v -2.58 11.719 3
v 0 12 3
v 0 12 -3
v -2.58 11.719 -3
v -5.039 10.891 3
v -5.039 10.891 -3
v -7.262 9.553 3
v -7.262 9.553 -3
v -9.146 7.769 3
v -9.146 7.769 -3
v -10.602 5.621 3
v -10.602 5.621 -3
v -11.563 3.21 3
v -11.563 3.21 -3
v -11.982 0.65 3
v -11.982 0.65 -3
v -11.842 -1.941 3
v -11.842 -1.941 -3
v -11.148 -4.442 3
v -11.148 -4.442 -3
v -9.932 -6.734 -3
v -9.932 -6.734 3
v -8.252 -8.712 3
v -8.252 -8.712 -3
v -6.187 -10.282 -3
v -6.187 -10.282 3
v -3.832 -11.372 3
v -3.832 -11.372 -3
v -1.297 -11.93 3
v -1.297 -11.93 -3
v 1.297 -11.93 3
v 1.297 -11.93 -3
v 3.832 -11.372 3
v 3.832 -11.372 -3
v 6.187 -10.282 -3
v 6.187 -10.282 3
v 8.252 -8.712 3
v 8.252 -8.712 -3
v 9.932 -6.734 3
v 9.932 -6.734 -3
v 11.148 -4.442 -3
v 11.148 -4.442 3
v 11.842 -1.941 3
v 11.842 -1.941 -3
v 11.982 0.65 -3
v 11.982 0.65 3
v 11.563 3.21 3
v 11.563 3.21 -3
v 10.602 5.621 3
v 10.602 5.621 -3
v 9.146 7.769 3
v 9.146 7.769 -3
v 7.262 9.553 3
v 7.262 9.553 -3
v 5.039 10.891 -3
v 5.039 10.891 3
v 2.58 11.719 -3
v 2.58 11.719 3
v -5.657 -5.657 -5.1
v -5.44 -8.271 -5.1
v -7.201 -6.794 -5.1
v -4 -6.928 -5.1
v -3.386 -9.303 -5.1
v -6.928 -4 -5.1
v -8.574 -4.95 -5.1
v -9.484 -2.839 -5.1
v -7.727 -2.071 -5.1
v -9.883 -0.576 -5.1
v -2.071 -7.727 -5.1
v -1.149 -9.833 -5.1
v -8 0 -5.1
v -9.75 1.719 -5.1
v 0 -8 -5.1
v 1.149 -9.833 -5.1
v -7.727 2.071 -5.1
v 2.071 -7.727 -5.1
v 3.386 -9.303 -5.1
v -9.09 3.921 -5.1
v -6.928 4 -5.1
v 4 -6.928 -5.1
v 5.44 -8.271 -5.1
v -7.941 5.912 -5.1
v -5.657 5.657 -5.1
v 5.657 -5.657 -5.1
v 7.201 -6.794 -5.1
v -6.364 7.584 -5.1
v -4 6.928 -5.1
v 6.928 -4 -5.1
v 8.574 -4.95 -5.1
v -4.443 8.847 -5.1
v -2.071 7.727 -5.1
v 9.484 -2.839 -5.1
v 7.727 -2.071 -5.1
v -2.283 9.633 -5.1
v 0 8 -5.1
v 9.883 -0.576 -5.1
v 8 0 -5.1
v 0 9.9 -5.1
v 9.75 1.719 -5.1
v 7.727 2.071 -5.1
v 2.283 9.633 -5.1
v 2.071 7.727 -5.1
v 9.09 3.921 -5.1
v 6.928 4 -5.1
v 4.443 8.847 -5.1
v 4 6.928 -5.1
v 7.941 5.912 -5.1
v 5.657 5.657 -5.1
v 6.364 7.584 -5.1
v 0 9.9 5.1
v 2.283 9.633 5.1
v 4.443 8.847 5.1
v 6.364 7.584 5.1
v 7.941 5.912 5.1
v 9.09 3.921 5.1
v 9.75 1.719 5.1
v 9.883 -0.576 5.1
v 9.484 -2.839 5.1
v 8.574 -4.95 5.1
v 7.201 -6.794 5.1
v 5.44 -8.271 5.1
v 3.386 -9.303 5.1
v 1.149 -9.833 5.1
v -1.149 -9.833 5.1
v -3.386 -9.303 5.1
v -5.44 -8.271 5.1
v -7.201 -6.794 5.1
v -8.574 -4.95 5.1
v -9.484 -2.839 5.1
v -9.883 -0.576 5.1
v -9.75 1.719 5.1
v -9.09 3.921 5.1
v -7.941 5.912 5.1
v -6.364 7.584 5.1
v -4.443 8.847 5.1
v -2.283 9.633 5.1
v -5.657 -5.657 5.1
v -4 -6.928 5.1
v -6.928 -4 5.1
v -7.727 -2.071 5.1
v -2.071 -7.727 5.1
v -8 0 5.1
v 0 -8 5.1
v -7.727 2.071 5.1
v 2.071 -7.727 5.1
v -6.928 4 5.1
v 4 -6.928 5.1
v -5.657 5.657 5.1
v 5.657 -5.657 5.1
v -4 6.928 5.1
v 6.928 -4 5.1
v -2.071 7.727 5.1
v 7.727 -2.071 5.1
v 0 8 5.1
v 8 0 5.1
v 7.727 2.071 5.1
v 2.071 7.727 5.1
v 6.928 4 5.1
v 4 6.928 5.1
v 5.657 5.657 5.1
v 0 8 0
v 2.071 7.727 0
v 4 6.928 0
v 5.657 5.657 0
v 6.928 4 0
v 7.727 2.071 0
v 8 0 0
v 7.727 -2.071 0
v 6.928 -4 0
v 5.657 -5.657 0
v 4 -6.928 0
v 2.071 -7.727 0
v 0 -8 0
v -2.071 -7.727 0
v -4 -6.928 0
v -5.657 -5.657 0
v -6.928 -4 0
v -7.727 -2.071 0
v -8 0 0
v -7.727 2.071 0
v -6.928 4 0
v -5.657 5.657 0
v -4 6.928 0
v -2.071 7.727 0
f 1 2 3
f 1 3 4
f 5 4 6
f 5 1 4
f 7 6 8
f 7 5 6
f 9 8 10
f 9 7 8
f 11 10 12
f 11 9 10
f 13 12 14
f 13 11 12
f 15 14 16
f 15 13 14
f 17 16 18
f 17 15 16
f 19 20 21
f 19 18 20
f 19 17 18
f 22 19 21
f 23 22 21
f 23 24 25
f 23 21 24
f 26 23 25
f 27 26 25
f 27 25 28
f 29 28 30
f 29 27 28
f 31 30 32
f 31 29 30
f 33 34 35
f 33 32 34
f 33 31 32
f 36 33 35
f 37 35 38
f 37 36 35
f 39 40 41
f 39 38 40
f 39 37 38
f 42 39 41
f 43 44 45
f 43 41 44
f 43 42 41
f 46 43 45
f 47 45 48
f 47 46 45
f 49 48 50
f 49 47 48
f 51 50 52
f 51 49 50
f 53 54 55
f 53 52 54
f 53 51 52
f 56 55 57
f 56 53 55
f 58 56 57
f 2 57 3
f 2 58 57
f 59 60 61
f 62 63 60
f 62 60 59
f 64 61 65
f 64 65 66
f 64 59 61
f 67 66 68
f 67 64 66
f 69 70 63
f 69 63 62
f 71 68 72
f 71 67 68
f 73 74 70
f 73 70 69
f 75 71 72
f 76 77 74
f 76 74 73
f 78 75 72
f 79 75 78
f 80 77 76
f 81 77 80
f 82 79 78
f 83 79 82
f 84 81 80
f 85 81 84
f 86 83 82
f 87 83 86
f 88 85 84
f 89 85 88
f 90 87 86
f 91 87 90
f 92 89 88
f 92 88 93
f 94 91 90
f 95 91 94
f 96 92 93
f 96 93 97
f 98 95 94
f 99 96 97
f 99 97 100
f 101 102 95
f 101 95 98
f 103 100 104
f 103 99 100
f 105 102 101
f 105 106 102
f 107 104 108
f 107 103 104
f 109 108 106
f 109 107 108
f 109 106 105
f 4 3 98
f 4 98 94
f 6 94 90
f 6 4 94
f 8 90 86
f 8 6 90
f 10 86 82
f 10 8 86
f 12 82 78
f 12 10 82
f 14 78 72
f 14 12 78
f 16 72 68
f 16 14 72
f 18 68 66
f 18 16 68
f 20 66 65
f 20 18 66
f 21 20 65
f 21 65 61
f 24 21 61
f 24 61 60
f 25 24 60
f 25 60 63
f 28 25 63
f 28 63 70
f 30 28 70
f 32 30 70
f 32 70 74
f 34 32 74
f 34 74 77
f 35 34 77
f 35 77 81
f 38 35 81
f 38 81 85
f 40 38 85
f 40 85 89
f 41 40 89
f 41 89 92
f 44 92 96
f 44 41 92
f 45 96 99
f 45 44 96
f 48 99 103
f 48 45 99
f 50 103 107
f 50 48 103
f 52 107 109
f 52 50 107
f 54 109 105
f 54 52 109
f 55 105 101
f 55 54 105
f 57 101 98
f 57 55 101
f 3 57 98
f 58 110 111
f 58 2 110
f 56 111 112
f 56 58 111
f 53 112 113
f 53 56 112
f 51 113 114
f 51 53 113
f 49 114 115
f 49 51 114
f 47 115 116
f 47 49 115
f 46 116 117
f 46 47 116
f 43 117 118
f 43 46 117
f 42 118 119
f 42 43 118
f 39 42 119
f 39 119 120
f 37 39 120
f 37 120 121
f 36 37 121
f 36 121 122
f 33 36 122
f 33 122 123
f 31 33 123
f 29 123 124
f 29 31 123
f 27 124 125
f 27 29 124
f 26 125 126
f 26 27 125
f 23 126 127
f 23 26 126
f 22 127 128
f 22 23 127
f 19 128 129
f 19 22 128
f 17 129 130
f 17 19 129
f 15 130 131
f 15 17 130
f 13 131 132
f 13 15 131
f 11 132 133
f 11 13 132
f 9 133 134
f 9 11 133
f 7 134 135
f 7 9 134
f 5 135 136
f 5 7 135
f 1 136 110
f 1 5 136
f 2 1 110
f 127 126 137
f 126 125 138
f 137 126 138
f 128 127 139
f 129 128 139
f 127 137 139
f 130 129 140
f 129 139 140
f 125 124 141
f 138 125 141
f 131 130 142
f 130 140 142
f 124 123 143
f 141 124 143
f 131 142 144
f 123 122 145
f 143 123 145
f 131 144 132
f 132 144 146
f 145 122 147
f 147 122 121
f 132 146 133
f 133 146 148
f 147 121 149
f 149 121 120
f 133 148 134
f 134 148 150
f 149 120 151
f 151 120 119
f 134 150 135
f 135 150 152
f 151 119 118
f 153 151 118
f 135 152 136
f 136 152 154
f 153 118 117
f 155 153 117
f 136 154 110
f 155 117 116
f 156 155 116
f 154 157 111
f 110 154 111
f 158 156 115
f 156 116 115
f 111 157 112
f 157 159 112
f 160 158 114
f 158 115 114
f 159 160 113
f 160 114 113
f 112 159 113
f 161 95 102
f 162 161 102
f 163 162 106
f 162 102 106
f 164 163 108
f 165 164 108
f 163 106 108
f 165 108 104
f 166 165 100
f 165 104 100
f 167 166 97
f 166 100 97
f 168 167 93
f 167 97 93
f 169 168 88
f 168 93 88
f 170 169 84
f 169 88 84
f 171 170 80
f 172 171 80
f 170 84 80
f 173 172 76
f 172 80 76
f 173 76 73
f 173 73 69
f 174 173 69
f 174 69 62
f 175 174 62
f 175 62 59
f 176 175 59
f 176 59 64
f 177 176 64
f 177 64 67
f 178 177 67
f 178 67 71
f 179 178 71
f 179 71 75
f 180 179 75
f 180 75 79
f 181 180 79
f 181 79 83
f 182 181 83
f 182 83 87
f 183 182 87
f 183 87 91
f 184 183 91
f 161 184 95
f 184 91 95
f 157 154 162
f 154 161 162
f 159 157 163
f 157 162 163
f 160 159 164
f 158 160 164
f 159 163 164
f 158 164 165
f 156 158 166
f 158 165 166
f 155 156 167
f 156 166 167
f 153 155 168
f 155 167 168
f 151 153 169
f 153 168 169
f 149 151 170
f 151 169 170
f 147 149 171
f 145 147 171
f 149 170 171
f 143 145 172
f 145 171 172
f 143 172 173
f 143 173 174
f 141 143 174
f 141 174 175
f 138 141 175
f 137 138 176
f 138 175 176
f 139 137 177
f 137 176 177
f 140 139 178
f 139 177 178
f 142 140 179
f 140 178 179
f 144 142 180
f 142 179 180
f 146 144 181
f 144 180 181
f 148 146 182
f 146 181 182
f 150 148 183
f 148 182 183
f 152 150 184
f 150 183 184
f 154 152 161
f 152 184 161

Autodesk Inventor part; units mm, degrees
ref_plane "YZ Plane" through (0, 0, 0) normal (1, 0, 0) x (0, 1, 0)
ref_plane "XZ Plane" through (0, 0, 0) normal (0, 1, 0) x (-1, 0, 0)
ref_plane "XY Plane" through (0, 0, 0) normal (0, 0, 1) x (1, 0, 0)
sketch "Boceto2" plane through (0, 0, 0) normal (1, 0, 0) x (0, 1, 0)
  line L0 (8, 5.1) -> (8, 0)
  line L1 (8, 0) -> (8, -5.1)
  line L2 (8, -5.1) -> (9.9, -5.1)
  line L3 (9.9, -5.1) -> (12, -3)
  line L4 (12, -3) -> (12, 3)
  line L5 (12, 3) -> (9.9, 5.1)
  line L6 (9.9, 5.1) -> (8, 5.1)
  line L7 (0, 19.536) -> (0, -22.6626)
  point P0 (0, 0)
  dimension "d2" = 6
  dimension "d3" = 5.1
  dimension "d4" = 4
  dimension "d5" = 135
  dimension "d6" = 5.1
  dimension "d7" = 8
revolve "Revolución1" add sketch "Boceto2" angle 360 about axis through (0, 0, 19.536) along (0, 0, -1)
properties part number "Rueda v" material "Caucho"
